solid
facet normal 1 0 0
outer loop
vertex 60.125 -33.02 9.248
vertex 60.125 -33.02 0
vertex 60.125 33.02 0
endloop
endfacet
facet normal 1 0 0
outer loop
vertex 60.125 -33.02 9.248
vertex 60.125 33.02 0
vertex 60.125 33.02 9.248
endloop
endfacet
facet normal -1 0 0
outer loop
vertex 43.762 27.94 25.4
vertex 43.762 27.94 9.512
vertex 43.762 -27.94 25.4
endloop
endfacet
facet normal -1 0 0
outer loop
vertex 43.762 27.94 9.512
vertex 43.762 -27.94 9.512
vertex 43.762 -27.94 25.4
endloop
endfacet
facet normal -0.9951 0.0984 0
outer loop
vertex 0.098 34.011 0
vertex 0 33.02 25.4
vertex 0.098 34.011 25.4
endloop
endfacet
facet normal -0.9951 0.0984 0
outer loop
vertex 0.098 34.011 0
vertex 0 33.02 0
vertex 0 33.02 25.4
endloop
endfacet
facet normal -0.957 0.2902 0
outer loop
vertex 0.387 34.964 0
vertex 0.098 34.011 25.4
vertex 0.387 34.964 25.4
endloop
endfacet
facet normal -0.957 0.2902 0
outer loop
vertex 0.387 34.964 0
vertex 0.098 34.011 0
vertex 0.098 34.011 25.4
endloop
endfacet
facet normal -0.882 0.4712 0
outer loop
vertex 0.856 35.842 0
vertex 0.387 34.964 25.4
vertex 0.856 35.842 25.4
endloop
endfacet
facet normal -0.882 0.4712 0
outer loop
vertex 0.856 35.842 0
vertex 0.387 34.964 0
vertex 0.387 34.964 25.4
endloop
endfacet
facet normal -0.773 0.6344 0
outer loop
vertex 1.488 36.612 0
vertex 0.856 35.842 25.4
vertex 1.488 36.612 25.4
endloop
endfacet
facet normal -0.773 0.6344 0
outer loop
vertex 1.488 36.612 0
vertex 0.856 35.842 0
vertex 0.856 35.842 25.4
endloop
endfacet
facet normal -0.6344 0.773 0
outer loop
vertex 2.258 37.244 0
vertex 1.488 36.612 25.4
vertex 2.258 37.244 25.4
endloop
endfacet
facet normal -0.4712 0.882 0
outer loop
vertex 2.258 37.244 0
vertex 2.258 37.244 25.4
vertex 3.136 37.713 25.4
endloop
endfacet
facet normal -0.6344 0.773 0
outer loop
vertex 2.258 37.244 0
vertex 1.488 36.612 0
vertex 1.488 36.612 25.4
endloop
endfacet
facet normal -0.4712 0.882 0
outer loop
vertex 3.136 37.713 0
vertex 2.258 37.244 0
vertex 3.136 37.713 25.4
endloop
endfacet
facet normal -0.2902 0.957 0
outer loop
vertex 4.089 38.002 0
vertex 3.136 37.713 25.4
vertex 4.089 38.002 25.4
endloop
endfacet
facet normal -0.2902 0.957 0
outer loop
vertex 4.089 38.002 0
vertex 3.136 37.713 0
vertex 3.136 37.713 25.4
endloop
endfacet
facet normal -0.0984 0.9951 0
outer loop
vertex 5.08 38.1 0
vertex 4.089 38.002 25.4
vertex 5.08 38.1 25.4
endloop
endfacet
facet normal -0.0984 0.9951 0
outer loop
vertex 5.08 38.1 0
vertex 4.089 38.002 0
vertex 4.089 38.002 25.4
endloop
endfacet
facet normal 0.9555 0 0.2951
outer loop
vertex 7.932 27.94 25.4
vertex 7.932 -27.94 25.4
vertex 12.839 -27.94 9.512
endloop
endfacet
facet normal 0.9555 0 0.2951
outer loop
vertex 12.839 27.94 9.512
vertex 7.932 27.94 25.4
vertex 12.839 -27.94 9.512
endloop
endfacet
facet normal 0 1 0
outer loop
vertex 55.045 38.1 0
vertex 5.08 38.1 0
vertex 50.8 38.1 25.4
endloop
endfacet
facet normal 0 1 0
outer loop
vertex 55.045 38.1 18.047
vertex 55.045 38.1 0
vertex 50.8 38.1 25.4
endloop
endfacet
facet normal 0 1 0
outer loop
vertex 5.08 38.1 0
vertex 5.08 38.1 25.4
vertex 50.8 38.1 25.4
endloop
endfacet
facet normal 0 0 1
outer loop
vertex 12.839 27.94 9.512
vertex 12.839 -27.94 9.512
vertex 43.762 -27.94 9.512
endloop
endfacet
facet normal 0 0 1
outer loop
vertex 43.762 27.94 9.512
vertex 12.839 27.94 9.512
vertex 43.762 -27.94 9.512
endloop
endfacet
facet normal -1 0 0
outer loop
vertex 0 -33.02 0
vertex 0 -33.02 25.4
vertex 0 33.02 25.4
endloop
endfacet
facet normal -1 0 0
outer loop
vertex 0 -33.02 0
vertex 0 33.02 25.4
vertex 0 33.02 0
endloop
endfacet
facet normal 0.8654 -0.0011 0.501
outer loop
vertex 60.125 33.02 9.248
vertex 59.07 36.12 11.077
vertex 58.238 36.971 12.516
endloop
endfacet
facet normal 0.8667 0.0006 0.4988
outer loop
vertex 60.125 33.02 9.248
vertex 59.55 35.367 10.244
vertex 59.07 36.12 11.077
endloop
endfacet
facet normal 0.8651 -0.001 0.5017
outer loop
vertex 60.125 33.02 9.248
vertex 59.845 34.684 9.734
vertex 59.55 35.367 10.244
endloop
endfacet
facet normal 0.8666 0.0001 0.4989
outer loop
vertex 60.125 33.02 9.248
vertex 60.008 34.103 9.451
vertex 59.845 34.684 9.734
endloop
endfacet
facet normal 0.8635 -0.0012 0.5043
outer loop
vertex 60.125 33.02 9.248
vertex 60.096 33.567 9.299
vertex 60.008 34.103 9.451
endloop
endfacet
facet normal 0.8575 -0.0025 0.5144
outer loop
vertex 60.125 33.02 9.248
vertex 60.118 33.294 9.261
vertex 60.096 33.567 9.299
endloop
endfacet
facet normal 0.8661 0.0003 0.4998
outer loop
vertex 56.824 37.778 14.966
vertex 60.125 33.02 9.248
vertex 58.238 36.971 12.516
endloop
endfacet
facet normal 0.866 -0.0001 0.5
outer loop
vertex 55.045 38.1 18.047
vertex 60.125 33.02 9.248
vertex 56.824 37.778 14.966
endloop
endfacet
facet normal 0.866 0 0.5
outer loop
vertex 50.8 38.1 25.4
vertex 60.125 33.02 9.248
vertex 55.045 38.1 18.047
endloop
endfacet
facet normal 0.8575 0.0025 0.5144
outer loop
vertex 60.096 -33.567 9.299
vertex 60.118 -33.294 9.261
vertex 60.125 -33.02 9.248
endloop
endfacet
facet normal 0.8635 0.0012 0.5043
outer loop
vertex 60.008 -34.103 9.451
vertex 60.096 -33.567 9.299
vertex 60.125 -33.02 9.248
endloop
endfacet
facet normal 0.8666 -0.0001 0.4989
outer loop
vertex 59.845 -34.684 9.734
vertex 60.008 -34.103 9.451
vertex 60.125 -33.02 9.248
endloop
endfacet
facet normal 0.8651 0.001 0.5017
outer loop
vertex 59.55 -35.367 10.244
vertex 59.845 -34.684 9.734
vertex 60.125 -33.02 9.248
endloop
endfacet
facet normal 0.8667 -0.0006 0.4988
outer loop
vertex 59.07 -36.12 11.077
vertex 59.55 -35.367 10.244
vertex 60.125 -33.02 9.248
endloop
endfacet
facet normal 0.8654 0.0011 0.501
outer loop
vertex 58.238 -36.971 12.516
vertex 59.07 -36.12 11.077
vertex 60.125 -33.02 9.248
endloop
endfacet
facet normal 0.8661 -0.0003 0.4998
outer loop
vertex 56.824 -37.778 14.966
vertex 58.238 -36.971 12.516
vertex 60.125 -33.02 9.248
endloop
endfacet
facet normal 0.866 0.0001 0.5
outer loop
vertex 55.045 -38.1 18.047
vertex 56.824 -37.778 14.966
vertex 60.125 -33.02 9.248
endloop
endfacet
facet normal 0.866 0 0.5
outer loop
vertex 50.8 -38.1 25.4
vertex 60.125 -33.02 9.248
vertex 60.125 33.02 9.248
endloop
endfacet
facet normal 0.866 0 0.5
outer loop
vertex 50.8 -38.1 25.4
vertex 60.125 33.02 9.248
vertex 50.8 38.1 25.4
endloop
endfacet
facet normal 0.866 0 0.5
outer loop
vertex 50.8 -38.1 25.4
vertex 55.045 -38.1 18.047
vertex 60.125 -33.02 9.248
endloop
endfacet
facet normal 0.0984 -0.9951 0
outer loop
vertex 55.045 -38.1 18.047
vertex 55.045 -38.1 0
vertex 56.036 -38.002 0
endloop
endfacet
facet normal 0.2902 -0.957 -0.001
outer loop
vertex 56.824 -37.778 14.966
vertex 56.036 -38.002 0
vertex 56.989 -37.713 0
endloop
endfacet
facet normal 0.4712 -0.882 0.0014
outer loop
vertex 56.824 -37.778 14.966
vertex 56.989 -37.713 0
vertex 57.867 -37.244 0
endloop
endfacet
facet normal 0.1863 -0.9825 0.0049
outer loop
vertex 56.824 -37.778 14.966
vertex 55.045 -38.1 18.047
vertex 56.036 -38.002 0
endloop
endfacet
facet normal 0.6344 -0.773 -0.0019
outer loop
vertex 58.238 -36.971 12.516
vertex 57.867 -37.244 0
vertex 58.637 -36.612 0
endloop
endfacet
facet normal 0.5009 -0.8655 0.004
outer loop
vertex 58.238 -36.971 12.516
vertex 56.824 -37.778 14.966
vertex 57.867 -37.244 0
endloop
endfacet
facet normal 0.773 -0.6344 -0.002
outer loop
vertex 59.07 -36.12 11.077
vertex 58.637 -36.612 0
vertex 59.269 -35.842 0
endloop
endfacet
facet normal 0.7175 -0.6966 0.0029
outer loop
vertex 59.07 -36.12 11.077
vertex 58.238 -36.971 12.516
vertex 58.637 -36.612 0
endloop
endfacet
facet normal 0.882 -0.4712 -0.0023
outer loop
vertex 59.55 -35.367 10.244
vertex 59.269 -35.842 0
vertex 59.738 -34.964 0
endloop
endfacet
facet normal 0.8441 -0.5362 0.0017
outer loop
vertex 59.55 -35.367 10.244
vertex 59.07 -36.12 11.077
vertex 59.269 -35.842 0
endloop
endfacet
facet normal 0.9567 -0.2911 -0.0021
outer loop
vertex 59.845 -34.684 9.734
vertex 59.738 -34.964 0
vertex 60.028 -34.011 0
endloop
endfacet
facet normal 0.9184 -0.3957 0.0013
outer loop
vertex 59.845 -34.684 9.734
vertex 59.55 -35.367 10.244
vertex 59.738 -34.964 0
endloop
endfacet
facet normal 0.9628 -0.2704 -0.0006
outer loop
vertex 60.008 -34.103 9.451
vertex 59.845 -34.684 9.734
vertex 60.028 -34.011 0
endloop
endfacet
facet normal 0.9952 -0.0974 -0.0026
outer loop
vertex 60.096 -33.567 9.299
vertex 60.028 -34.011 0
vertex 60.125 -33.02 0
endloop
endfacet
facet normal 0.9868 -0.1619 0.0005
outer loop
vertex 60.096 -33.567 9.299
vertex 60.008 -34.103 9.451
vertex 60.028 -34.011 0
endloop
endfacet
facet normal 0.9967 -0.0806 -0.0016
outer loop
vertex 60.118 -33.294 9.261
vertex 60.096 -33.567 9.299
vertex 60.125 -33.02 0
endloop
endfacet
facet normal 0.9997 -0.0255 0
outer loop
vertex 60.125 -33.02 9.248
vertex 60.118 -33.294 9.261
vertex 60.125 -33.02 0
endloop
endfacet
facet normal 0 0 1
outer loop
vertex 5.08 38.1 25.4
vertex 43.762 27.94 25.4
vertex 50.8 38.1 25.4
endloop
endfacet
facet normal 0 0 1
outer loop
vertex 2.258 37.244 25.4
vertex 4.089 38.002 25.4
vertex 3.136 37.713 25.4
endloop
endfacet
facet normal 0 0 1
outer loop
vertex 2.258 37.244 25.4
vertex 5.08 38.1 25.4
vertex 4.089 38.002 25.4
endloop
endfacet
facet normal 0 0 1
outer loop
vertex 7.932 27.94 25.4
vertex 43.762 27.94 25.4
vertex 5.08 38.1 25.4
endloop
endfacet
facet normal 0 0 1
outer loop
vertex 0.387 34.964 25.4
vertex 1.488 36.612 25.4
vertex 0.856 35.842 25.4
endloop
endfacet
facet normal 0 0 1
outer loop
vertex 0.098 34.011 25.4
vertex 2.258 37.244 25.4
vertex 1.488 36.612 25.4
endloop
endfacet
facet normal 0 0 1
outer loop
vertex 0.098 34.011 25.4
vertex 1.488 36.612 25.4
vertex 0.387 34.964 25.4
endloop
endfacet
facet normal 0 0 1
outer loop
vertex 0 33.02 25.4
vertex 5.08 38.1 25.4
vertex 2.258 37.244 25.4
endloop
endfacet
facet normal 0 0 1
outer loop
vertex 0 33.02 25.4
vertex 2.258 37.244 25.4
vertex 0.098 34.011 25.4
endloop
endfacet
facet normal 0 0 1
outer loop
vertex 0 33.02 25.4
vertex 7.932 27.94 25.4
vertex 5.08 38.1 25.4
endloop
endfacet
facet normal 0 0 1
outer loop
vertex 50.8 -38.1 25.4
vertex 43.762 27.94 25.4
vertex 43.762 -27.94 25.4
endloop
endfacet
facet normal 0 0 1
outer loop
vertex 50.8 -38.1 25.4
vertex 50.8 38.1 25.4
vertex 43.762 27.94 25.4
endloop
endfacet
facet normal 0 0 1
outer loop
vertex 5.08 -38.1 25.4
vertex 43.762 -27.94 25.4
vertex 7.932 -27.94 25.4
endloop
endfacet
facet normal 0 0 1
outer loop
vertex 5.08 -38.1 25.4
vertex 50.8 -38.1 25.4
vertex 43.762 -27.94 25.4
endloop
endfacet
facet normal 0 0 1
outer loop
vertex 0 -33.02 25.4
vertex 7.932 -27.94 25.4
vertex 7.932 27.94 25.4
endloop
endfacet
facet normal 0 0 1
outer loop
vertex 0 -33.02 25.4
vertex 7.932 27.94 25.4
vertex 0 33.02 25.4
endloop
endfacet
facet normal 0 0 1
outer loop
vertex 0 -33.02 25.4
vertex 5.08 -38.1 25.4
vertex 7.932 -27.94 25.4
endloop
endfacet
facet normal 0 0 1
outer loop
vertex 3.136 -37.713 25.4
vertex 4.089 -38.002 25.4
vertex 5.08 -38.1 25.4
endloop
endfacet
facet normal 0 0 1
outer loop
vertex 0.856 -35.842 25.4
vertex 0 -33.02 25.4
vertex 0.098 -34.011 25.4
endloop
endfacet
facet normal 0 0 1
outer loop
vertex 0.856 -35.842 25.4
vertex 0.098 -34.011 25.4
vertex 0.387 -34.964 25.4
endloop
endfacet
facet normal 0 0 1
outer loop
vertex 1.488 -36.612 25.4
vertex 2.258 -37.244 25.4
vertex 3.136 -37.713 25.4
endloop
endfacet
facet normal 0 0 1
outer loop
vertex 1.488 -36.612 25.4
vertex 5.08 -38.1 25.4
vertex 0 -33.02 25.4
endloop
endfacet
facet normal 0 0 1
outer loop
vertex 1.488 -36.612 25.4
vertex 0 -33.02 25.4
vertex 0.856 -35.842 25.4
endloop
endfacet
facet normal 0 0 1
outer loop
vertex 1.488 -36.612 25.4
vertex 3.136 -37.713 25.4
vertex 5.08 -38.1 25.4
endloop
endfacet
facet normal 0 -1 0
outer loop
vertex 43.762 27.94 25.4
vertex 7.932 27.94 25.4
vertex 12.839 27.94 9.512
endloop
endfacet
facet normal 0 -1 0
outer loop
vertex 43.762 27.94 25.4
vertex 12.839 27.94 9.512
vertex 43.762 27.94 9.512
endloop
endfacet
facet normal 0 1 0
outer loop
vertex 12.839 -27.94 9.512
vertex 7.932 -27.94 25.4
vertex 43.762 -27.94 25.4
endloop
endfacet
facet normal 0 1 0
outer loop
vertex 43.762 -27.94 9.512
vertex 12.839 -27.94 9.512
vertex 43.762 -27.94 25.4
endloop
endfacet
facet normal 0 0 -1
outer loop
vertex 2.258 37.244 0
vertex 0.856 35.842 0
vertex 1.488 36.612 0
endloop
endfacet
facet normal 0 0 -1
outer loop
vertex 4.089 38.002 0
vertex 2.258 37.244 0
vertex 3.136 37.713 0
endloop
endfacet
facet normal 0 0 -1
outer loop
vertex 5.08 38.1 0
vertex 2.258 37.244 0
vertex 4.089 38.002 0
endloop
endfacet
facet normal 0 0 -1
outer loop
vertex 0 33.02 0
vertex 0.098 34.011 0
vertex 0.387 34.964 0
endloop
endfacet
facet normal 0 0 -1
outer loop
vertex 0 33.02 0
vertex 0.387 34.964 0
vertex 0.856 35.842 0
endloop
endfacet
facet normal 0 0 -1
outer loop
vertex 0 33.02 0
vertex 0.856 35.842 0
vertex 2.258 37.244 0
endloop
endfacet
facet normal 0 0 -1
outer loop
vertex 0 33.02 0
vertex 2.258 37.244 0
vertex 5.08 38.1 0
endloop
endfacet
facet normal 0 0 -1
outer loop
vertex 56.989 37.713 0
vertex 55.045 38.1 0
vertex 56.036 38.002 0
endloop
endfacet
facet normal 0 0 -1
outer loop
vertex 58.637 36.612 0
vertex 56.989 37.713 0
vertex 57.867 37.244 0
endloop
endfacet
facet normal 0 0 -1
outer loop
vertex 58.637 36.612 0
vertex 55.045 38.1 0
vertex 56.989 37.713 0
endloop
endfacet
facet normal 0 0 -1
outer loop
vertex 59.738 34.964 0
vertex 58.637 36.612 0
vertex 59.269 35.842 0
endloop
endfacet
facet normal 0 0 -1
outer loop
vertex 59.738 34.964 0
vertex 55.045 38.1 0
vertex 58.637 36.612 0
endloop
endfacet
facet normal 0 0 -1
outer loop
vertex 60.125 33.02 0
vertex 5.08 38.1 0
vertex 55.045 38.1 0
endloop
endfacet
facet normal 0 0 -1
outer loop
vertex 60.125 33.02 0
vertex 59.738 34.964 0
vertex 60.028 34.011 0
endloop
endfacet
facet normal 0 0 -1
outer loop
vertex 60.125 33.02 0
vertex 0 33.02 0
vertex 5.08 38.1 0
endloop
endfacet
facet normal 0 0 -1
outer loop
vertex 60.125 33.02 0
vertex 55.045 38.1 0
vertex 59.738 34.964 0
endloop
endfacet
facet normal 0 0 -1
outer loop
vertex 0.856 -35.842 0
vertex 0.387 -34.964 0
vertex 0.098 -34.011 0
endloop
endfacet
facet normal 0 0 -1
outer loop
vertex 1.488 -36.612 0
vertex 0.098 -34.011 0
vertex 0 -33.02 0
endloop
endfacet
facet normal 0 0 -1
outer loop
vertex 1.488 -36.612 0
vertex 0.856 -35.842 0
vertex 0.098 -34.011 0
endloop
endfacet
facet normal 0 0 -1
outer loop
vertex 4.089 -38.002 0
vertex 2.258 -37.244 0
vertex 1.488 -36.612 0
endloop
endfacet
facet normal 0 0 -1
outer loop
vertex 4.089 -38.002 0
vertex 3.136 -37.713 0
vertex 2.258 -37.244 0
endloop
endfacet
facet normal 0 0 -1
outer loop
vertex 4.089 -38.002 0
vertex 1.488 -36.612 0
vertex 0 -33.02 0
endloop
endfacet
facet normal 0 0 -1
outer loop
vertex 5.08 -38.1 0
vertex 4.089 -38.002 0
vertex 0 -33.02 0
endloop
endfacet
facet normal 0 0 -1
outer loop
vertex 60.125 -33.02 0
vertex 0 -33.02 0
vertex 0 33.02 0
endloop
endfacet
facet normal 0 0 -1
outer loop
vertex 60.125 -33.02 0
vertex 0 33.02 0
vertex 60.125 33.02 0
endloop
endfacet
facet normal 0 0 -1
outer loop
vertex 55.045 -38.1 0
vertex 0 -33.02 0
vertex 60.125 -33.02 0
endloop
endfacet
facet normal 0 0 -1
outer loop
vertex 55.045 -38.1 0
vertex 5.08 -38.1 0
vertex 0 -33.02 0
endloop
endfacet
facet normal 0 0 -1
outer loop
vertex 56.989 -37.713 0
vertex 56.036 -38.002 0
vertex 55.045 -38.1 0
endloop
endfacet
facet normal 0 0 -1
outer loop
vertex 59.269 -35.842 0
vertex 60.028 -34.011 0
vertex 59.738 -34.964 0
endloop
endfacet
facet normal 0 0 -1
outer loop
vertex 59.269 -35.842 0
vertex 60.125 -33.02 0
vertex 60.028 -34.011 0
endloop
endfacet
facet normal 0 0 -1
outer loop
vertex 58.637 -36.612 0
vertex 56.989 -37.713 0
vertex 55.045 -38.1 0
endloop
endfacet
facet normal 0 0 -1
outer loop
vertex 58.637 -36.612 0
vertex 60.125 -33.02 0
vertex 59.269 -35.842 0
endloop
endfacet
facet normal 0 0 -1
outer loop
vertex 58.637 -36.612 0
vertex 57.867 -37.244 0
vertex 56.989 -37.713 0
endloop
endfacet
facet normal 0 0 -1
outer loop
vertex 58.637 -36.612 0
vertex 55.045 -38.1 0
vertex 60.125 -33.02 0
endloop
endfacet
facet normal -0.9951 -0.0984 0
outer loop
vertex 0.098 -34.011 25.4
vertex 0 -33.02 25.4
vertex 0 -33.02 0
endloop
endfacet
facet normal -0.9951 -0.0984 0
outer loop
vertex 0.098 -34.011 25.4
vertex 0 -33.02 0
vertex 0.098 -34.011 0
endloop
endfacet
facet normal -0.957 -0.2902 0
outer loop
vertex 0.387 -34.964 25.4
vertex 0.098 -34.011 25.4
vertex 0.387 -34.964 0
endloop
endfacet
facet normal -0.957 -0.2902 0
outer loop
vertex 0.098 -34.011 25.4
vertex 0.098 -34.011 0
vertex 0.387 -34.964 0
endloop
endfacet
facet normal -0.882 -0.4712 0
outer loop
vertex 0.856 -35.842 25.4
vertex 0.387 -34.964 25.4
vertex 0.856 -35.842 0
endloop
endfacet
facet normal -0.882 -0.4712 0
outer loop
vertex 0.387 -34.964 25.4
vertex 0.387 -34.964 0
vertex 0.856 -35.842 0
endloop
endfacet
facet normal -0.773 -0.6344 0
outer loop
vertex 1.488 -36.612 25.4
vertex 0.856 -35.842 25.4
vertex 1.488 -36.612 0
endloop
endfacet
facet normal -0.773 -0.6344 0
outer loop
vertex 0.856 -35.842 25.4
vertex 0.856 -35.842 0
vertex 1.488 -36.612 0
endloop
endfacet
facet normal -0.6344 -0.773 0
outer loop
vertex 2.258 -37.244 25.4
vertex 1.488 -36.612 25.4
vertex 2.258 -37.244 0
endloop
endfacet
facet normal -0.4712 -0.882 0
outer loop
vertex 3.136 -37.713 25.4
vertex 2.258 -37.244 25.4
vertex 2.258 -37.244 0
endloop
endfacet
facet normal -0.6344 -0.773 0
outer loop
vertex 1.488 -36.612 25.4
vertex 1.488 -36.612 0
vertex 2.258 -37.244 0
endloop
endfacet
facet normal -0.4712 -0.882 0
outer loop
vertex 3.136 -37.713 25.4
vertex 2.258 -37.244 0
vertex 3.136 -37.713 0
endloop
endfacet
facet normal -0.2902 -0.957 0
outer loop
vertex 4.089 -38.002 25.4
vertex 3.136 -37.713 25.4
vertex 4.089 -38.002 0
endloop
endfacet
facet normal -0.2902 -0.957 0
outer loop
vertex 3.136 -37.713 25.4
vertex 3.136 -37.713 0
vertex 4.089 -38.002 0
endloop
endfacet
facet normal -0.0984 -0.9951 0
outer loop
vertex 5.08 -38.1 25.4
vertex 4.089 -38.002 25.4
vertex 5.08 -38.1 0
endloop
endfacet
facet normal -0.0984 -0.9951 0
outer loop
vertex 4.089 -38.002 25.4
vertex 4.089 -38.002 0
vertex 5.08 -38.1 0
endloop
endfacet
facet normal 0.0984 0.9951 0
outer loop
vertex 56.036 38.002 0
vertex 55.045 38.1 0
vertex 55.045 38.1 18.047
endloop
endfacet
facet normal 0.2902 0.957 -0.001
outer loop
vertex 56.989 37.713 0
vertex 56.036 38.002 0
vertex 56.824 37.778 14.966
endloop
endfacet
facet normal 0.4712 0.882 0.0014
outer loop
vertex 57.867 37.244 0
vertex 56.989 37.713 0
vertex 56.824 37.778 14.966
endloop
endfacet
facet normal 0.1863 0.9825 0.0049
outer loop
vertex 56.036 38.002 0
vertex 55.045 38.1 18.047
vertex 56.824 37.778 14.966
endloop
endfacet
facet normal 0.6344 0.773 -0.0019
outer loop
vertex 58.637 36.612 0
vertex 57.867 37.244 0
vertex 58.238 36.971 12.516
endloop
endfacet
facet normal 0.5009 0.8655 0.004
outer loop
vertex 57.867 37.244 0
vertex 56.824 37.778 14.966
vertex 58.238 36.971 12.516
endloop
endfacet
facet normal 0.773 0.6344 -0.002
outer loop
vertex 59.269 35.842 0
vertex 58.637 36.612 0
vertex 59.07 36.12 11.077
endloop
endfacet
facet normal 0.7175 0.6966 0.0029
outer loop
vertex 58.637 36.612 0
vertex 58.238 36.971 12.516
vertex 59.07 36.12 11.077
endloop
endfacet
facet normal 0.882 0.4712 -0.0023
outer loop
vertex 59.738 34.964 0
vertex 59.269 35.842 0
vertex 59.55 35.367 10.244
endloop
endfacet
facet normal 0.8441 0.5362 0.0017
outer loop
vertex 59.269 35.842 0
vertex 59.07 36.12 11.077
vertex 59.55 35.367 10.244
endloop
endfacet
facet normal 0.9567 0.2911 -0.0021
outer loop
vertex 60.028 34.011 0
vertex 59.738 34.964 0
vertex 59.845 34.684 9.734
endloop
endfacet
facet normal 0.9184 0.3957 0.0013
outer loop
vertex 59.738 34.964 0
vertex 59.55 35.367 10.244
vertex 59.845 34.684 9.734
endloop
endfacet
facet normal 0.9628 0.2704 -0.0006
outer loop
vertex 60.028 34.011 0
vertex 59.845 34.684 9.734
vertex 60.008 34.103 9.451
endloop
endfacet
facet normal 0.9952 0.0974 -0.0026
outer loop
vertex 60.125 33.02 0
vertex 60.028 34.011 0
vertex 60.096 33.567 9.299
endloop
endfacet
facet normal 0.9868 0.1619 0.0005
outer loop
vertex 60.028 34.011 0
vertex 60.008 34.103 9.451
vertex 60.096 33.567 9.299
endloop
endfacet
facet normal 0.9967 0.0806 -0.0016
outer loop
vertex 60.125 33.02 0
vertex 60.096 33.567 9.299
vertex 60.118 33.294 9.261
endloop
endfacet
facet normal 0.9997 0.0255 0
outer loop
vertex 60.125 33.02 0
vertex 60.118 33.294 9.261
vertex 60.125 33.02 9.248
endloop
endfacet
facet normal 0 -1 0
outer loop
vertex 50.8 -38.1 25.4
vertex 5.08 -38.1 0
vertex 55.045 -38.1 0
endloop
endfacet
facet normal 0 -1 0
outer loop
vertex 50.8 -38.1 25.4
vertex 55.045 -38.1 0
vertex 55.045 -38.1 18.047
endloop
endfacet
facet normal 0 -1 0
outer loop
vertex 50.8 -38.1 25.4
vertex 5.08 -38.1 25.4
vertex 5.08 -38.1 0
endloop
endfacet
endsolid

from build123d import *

# Parameters (mm, degrees)
F1_DEPTH = 38.1
F3_DEPTH = 27.94
F4_R     = 5.08


with BuildPart() as f1:
    # F0 (on Front) → F1 (new body, symmetric)
    with BuildSketch(Plane.XZ):
        Polygon((0, 25.4), (0, 0), (60.125147, 0), (60.125147, 9.248371), (50.8, 25.4), align=None)
    extrude(amount=F1_DEPTH, both=True)

    # F2 (on Front) → F3 (cut, symmetric)
    with BuildSketch(Plane.XZ):
        Polygon((43.762105, 25.4), (7.93214, 25.4), (12.838667, 9.5122), (43.762105, 9.5122), align=None)
    extrude(amount=F3_DEPTH, both=True, mode=Mode.SUBTRACT)

    # F4
    f4_edges = [f1.edges().sort_by_distance(p)[0] for p in [
        (0, -38.1, 12.7),
        (60.125147, -38.1, 4.624185),
        (60.125147, 38.1, 4.624185),
        (0, 38.1, 12.7),
    ]]
    fillet(f4_edges, radius=F4_R)


solid = f1.part
